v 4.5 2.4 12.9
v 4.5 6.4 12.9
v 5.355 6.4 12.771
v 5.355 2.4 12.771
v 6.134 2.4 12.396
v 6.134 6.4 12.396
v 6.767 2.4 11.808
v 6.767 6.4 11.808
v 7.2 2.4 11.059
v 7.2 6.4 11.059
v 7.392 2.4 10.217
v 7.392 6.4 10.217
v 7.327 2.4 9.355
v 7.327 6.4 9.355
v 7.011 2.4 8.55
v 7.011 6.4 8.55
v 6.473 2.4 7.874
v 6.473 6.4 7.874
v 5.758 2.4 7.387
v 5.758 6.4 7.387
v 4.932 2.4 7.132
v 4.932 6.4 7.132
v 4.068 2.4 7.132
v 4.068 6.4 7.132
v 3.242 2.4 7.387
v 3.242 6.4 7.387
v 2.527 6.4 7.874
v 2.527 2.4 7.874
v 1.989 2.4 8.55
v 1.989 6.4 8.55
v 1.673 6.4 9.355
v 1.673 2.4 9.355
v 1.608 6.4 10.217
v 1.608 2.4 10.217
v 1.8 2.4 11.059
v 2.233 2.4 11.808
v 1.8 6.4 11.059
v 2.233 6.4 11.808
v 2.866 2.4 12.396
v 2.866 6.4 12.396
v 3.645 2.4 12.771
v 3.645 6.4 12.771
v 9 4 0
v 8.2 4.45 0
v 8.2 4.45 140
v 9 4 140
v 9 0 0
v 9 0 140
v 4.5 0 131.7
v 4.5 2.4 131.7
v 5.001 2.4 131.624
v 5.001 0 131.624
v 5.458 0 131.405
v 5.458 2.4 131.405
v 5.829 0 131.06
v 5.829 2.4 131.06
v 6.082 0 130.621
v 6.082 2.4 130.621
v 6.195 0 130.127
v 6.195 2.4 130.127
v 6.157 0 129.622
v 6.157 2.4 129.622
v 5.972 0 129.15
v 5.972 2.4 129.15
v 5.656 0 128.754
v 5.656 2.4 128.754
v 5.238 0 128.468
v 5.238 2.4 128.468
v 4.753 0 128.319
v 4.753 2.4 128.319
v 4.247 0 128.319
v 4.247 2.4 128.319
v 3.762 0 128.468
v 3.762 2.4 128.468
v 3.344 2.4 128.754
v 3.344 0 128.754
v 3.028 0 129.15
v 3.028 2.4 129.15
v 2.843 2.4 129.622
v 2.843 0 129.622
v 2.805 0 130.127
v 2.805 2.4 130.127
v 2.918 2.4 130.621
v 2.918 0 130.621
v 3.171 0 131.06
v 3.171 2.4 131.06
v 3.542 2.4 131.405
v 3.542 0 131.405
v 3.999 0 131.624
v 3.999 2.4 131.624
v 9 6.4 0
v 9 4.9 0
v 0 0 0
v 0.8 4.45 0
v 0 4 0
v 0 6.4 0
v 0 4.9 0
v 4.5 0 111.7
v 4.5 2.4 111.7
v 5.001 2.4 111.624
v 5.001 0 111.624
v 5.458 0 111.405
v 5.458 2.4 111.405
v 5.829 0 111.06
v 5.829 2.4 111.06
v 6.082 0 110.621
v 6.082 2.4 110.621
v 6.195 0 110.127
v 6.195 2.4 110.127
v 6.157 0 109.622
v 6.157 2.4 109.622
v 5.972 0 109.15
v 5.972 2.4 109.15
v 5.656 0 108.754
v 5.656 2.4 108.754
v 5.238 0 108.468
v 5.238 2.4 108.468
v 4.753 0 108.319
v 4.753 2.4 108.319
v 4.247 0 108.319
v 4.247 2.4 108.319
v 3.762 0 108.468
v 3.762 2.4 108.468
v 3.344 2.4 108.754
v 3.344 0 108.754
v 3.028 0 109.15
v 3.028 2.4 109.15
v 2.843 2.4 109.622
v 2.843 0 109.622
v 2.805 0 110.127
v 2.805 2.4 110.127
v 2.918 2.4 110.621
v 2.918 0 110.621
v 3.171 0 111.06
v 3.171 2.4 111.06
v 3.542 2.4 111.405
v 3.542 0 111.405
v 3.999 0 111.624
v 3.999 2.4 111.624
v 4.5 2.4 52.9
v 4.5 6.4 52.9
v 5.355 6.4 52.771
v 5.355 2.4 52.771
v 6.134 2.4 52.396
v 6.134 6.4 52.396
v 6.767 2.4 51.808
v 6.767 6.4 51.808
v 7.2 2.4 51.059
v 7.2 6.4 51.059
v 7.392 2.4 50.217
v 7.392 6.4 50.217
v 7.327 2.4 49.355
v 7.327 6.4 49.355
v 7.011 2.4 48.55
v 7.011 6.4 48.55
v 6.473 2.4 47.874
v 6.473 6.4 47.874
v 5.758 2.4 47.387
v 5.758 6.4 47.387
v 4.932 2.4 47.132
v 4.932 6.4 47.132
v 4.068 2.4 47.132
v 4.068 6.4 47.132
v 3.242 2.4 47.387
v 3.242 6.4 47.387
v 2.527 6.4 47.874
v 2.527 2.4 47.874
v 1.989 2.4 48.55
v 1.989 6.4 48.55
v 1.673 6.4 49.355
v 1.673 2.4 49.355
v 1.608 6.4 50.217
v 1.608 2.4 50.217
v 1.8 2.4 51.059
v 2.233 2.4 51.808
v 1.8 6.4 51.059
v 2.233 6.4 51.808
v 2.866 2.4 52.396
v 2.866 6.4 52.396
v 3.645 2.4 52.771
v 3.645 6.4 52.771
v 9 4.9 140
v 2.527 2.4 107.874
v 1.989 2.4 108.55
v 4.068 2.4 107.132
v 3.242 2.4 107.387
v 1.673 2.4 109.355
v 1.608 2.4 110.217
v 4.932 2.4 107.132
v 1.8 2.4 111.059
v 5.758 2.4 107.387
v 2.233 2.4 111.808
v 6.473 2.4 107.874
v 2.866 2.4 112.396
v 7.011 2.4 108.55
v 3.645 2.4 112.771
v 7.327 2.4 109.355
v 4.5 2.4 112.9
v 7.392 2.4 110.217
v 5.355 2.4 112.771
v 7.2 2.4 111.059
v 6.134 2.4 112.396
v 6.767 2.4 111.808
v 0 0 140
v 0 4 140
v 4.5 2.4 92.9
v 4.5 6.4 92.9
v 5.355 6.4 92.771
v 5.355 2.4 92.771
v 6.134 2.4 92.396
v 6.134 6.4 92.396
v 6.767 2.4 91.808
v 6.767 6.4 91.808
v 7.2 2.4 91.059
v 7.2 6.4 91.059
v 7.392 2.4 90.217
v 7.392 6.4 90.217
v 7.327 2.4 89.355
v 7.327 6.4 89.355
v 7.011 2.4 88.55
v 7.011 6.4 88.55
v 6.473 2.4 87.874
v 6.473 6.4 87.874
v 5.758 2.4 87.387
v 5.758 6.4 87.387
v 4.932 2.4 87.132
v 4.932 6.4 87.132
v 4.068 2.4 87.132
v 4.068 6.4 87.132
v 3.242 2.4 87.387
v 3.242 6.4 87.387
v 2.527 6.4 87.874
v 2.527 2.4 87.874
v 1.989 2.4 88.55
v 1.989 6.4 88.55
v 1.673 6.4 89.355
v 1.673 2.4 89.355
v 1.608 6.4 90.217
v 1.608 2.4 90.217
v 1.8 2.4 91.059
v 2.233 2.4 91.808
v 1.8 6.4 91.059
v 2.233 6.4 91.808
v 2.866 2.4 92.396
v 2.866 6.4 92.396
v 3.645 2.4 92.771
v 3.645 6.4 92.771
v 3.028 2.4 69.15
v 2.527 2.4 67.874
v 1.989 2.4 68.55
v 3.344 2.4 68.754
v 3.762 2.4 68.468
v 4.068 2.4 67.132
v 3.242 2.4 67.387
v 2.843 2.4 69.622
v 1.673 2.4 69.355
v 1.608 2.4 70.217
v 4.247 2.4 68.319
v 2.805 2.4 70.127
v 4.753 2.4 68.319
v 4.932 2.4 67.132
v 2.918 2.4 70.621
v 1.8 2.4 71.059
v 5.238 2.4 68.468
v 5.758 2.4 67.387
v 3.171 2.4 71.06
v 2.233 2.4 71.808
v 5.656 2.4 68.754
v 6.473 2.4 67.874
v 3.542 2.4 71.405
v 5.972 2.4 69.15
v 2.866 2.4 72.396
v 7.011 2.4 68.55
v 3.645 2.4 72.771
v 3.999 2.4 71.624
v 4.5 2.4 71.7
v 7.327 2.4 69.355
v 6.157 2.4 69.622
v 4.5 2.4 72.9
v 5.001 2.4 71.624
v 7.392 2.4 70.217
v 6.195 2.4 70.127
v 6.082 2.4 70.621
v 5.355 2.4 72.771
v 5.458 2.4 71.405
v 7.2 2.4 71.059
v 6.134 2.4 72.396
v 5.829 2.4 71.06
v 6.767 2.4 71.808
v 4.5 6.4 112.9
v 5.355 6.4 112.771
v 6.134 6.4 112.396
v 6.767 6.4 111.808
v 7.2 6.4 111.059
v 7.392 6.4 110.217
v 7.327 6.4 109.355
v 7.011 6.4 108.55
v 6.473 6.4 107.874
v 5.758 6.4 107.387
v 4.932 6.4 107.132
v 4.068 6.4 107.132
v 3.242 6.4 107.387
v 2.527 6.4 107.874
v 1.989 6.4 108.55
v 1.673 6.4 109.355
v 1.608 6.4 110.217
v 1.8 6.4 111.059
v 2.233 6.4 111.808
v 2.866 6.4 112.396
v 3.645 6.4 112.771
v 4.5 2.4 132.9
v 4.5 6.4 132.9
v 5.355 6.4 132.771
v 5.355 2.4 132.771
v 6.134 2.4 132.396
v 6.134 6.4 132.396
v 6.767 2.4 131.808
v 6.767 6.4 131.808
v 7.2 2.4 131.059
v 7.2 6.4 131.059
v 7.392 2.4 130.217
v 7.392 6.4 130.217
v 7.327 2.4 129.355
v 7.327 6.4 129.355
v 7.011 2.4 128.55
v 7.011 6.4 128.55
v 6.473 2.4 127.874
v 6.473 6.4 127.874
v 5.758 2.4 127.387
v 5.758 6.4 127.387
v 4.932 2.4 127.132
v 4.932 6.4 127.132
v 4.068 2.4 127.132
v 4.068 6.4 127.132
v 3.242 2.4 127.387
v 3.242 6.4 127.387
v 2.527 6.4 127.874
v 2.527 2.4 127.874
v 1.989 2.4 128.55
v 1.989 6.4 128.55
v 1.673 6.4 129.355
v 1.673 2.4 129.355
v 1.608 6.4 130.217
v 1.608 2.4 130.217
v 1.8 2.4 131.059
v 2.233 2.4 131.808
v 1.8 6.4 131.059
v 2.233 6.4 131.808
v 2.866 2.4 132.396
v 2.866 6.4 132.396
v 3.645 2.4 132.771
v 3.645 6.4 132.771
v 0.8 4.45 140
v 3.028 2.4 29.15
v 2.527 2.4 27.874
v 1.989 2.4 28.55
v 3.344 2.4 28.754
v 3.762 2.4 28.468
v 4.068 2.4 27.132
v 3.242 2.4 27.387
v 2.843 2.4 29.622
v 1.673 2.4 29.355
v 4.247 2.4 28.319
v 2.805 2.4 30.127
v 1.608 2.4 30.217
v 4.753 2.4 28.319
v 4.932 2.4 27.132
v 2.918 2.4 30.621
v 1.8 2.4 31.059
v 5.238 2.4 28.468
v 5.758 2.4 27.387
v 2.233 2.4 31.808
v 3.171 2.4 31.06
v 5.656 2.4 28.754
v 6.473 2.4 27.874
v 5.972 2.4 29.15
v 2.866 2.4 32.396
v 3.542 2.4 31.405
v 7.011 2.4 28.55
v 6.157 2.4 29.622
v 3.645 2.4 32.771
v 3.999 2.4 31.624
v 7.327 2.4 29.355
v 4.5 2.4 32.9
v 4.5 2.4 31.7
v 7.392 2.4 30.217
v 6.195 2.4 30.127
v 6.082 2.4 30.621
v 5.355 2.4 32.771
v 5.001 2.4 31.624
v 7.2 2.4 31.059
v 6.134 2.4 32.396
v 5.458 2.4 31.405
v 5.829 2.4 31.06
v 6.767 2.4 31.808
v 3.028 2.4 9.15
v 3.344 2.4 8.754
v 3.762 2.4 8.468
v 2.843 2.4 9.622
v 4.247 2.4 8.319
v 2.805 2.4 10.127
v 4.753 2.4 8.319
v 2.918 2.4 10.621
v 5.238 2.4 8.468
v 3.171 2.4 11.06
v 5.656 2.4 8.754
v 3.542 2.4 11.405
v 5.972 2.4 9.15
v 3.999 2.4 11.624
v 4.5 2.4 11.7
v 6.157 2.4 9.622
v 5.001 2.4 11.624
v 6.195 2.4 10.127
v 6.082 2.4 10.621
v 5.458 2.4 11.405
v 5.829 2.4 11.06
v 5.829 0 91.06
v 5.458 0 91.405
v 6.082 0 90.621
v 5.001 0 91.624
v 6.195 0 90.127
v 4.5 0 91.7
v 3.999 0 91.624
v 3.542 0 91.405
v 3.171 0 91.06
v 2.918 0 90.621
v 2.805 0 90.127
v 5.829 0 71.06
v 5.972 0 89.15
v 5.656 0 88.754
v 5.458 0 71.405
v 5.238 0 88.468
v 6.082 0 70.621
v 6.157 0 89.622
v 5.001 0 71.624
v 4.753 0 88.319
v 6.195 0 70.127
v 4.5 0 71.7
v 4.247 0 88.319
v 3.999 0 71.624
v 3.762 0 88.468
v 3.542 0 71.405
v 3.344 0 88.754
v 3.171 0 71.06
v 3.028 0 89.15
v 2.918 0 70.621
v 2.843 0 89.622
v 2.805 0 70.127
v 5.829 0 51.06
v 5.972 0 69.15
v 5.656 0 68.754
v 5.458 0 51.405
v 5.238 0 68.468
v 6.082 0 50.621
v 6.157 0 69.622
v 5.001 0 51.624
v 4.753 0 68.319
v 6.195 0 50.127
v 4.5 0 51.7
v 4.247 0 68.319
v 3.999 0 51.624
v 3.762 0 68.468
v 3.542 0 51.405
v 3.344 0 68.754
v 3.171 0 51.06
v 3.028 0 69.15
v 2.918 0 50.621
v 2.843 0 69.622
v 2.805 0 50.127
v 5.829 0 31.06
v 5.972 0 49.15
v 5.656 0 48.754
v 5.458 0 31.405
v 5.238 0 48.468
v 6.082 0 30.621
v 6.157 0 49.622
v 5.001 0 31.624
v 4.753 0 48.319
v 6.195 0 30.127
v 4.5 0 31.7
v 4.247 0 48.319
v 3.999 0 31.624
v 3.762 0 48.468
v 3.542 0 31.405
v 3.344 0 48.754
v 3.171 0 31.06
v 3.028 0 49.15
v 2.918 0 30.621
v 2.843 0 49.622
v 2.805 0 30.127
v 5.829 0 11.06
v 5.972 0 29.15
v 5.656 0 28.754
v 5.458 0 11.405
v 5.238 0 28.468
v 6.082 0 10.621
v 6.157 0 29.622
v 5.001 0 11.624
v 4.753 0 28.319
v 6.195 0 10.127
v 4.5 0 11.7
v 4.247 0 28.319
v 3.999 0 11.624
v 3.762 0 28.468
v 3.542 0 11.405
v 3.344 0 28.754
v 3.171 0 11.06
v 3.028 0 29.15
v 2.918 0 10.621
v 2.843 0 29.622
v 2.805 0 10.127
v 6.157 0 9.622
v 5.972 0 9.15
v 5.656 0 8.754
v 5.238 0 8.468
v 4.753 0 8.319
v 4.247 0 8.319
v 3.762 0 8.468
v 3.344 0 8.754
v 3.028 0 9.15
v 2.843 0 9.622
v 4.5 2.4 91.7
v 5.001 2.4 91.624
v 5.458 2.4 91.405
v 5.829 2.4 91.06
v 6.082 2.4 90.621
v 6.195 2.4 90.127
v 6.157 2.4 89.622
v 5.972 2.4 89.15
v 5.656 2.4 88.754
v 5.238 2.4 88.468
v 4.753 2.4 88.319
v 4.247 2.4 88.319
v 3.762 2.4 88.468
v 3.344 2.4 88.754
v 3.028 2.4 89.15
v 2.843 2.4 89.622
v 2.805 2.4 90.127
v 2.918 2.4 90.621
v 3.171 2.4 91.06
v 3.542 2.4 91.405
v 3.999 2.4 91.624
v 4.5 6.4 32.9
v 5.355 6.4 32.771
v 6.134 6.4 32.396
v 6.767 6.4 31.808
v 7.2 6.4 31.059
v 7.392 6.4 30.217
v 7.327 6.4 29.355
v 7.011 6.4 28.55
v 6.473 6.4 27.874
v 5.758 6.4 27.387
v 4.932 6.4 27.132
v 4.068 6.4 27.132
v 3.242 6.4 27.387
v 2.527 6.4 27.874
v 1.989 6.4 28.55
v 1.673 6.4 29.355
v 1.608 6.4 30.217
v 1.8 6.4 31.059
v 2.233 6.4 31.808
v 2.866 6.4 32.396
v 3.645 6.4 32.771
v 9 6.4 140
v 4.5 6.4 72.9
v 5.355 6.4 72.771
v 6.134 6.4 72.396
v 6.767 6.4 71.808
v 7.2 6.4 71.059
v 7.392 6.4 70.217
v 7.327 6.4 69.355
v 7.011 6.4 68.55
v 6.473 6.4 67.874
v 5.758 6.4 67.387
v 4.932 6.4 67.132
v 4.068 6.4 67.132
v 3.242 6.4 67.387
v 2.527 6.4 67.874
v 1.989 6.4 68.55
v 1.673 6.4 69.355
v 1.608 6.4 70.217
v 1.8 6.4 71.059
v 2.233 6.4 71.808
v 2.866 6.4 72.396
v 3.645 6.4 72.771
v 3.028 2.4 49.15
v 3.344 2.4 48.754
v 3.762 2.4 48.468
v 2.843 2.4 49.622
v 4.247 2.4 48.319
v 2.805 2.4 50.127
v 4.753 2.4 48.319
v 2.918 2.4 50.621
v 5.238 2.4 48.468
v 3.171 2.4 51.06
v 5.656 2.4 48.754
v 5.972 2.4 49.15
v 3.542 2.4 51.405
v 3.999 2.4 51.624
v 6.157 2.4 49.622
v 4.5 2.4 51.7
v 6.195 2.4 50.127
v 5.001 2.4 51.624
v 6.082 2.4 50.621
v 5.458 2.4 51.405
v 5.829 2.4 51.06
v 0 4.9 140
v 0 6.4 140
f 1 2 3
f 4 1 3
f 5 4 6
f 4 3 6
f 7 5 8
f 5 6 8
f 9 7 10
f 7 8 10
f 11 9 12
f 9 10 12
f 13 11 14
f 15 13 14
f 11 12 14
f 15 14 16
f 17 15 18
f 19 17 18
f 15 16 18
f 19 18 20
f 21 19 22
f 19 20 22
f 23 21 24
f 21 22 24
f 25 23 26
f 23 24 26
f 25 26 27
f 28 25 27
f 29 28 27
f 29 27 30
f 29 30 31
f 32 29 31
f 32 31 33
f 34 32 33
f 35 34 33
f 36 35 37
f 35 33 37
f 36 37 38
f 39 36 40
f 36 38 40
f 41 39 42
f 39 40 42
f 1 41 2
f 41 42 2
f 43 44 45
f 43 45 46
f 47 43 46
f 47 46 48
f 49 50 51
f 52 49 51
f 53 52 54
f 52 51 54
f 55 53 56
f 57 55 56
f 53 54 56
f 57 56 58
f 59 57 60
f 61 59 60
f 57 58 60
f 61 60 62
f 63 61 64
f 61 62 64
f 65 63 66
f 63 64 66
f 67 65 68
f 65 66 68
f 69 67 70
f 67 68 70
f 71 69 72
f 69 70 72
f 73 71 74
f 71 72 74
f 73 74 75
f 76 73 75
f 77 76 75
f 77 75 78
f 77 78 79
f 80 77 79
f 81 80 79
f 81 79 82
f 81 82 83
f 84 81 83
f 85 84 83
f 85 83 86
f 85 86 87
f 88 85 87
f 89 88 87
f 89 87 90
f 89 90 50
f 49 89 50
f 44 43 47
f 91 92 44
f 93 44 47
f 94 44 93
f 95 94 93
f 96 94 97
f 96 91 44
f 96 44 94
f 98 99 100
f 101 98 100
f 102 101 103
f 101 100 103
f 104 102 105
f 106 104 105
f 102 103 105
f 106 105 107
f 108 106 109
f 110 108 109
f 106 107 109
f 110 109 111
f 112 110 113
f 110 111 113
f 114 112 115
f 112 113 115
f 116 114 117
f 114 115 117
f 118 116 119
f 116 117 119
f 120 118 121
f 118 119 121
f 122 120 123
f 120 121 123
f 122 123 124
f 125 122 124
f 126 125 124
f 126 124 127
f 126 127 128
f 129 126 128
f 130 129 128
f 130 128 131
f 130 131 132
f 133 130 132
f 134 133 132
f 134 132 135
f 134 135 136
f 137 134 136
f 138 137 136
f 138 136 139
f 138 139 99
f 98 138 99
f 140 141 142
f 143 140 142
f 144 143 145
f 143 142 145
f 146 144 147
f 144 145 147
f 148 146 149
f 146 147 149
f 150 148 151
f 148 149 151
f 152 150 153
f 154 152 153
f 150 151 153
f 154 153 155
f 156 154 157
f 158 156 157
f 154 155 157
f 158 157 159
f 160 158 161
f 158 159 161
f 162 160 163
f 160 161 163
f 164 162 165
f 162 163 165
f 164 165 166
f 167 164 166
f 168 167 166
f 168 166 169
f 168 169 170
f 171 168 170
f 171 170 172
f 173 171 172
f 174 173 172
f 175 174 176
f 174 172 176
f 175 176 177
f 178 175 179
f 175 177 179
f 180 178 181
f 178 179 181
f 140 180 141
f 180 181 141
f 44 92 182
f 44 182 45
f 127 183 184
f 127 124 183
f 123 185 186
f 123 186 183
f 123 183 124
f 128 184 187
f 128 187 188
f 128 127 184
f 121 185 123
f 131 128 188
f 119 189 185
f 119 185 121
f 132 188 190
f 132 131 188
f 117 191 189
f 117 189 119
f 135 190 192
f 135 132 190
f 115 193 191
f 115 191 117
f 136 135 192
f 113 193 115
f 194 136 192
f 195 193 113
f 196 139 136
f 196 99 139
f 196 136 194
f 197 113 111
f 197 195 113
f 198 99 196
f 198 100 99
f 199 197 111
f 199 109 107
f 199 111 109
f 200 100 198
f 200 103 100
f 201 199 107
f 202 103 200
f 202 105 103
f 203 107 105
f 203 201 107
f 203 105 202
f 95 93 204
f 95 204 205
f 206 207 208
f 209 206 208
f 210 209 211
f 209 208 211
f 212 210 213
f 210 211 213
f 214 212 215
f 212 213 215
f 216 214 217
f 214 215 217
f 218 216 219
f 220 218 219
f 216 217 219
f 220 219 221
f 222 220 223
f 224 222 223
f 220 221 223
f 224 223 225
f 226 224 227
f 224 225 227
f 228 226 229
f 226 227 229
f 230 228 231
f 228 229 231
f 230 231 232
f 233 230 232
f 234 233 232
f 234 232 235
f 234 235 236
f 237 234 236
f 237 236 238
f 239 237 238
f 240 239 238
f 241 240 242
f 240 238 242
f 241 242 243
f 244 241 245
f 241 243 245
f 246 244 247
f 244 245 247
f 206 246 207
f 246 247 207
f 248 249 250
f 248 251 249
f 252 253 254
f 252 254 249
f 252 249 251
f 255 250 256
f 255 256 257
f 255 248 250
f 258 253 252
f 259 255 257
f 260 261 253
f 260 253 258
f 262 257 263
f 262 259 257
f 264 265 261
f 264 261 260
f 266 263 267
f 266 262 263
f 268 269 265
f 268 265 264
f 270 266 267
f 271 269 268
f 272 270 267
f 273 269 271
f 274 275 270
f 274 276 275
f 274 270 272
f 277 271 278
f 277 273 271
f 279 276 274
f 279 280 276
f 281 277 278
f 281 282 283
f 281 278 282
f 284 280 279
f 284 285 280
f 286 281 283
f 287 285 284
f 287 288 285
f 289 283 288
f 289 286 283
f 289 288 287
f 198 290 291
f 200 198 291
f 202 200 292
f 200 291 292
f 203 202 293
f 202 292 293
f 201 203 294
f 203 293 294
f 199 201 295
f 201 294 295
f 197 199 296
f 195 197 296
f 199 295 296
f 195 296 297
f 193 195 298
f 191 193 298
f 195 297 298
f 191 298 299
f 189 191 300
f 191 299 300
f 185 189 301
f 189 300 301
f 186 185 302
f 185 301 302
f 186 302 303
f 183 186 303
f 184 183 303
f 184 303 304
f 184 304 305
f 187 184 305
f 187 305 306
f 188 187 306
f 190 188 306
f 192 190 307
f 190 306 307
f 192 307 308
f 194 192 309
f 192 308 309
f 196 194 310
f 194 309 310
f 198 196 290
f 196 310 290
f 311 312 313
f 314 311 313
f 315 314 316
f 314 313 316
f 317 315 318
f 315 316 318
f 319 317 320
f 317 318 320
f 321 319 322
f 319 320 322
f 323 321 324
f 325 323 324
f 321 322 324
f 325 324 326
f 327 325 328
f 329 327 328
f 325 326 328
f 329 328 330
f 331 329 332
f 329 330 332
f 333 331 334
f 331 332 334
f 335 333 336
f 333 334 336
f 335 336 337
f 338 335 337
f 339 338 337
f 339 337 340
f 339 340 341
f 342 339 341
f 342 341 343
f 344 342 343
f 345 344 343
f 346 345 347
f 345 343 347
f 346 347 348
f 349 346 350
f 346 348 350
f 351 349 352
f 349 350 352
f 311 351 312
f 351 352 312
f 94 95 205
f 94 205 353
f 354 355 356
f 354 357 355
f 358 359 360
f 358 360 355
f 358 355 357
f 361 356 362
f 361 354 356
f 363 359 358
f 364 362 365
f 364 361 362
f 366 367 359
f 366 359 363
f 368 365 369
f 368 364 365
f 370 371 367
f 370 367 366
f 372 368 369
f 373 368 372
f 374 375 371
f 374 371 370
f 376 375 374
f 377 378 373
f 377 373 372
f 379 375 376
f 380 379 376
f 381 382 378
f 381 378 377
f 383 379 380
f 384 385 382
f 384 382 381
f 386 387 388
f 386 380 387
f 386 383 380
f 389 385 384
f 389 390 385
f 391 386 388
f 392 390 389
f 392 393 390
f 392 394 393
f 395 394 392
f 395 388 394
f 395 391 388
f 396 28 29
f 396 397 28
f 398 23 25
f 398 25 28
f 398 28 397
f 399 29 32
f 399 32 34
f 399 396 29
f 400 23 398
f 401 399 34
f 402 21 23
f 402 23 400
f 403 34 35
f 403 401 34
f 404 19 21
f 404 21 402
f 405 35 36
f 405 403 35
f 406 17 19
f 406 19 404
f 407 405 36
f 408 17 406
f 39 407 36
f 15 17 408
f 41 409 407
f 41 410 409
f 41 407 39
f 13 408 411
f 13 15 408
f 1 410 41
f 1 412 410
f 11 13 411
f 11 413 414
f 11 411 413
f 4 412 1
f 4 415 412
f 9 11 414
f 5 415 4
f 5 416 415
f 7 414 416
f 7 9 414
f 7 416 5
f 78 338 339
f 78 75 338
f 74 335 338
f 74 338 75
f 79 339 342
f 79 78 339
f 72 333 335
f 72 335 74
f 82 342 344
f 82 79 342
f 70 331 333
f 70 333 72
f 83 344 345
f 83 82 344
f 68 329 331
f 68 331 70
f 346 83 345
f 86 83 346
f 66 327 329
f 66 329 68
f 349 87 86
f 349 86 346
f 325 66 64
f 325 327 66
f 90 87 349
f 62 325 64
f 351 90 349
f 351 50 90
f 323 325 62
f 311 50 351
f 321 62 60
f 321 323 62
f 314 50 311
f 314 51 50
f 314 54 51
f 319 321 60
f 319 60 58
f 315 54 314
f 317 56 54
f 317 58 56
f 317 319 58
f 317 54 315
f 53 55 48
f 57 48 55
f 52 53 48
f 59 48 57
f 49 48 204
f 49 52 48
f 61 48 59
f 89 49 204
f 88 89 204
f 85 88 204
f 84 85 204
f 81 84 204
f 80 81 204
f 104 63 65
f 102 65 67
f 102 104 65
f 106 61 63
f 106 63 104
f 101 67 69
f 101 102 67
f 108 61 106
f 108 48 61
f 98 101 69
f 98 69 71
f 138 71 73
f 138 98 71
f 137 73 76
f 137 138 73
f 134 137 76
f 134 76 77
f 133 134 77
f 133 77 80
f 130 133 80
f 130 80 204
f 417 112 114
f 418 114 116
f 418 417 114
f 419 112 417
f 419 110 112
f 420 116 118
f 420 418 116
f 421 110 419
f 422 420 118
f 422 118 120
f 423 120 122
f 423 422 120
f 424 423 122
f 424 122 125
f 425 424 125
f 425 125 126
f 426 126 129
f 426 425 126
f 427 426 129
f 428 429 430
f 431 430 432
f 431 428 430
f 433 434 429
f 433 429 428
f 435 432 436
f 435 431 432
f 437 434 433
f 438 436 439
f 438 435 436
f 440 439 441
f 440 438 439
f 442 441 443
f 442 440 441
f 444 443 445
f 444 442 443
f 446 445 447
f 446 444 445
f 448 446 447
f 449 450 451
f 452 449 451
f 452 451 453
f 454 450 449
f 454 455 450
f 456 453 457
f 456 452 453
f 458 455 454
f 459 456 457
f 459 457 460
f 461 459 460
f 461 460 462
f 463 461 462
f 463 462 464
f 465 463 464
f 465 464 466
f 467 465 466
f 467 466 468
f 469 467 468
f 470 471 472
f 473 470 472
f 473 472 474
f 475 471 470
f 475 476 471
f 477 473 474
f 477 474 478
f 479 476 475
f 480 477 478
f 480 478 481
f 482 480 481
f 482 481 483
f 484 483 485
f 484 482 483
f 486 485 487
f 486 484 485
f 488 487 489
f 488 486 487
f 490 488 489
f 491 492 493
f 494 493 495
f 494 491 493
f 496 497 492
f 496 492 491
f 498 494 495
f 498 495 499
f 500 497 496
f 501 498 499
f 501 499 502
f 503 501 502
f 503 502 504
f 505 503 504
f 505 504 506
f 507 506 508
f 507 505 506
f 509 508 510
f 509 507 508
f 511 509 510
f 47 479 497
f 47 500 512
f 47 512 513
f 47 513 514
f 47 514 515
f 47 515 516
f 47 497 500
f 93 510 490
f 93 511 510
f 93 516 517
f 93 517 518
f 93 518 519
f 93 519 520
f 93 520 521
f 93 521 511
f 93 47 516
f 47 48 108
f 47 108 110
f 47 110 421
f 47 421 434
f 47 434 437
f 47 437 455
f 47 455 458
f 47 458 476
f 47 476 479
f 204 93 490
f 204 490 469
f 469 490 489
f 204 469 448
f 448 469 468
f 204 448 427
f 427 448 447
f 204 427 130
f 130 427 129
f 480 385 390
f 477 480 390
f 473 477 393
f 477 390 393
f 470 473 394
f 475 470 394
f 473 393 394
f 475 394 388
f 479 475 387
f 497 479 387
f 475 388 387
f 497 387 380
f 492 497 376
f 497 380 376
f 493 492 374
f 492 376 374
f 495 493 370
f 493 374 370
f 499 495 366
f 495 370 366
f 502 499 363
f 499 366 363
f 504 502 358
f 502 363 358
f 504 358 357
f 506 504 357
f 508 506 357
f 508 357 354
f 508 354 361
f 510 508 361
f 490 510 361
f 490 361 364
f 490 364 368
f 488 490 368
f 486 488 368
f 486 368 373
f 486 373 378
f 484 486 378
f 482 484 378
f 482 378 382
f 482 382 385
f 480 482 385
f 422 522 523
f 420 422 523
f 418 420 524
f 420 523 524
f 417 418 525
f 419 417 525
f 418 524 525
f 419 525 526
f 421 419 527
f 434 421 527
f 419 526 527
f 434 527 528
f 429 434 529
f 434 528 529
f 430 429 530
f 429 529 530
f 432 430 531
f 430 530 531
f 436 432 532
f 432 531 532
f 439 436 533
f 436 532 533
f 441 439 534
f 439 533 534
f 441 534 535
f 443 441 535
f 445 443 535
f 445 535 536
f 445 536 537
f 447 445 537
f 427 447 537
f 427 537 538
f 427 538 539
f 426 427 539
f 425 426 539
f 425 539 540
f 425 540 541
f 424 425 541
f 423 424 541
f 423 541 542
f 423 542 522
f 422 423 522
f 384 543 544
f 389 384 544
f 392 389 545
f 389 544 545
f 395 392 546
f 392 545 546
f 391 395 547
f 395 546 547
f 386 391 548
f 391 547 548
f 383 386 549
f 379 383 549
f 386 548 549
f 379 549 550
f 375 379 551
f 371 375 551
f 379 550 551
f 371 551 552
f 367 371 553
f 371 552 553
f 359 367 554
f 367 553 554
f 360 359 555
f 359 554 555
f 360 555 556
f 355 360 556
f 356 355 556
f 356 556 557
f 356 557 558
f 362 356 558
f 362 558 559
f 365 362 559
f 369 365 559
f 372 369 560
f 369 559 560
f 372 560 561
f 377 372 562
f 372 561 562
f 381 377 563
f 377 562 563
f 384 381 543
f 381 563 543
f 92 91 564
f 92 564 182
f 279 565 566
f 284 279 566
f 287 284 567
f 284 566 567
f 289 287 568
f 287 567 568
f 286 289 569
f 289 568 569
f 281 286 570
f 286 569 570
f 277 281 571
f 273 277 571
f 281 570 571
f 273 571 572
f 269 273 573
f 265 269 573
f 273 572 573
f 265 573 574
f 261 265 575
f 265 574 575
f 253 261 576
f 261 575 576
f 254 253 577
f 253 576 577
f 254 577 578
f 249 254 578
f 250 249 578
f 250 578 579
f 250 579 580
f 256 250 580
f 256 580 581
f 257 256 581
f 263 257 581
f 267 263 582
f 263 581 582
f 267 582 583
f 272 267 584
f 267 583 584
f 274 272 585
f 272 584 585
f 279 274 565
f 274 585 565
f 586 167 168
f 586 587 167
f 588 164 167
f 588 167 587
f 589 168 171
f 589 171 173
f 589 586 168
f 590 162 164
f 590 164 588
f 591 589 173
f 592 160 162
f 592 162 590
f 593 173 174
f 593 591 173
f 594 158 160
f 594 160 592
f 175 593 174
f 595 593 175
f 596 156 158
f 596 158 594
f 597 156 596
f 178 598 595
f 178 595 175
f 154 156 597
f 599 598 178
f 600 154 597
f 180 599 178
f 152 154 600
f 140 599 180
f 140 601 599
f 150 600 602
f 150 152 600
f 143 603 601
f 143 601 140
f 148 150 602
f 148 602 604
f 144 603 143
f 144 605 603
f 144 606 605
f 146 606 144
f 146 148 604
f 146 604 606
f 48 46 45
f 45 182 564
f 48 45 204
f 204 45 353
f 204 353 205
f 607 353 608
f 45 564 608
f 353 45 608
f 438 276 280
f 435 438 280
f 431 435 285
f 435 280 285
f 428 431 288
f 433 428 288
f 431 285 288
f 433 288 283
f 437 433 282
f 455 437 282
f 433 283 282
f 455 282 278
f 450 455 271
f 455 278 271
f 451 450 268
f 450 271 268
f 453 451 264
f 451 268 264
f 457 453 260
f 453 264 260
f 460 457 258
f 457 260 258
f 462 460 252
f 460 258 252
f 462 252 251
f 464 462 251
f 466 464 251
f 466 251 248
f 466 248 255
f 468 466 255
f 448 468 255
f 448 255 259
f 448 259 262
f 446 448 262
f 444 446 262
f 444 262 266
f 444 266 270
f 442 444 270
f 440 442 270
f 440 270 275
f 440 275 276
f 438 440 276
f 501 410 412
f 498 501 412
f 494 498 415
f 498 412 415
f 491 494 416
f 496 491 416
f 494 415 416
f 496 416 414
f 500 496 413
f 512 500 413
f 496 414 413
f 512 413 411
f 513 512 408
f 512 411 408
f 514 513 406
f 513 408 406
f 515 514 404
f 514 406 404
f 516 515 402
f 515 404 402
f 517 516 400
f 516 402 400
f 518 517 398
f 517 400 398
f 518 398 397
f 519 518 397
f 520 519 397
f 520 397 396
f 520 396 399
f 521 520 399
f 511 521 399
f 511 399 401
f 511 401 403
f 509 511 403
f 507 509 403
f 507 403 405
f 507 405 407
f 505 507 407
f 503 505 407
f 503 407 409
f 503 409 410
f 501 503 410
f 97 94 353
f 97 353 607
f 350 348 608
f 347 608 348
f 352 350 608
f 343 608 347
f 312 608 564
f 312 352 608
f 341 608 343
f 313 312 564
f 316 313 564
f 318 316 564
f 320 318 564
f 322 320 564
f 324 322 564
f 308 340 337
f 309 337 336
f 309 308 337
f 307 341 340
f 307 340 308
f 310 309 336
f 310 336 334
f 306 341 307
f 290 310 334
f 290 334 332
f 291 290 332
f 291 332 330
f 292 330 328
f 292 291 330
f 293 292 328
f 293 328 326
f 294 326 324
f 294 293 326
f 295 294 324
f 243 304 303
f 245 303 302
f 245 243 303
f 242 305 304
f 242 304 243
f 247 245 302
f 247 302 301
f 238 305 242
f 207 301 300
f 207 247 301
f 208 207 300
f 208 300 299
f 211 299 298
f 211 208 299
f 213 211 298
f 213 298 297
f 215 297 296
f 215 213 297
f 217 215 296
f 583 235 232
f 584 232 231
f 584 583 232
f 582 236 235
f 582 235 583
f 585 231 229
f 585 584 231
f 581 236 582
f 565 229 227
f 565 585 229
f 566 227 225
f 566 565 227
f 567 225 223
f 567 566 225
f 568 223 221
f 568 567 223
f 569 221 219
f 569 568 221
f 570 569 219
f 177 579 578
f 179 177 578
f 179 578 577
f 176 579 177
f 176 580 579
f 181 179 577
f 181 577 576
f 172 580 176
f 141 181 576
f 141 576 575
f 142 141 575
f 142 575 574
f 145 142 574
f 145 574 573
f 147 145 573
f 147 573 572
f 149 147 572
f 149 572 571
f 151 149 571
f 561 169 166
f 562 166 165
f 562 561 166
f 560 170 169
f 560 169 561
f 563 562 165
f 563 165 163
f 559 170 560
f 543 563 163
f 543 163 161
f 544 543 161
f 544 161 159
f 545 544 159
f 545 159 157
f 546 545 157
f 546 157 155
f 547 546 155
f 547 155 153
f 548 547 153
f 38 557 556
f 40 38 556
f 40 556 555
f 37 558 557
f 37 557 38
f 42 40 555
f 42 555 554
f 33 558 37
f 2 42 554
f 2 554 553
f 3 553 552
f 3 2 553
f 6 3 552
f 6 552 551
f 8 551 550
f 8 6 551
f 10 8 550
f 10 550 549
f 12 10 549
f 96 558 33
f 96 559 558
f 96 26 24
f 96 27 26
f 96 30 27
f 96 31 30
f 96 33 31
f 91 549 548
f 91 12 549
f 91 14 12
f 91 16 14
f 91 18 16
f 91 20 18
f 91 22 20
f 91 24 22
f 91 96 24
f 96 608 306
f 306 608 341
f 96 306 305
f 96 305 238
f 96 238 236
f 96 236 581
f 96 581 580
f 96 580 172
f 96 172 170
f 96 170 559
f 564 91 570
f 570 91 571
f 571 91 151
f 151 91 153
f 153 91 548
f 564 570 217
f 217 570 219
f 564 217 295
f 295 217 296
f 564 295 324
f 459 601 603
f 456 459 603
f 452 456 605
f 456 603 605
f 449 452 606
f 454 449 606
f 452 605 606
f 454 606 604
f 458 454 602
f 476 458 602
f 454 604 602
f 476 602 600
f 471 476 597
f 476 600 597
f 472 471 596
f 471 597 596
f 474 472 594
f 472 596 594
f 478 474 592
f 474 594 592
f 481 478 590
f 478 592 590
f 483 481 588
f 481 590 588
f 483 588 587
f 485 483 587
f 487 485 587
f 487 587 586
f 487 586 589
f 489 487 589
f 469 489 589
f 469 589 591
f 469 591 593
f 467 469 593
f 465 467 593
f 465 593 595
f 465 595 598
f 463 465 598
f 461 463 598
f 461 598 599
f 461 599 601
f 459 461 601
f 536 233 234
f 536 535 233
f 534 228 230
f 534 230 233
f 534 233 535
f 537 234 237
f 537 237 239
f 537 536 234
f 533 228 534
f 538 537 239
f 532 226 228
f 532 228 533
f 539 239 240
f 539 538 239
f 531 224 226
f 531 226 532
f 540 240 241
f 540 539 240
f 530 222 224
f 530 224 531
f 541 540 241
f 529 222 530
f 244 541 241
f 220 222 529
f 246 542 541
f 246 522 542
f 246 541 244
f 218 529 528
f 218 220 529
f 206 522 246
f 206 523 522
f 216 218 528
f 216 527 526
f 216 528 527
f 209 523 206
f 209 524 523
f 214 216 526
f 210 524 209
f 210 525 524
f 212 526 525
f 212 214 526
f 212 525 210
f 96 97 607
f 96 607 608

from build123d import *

# Parameters (mm, degrees)
BOSS_EXTRUDE1_DEPTH = 140
SKETCH2_R           = 2.9
CUT_EXTRUDE1_DEPTH  = 4
SKETCH3_R           = 1.7
CUT_EXTRUDE2_DEPTH  = 141.346001012


with BuildPart() as part:
    # Sketch1 → Boss-Extrude1 (new body)
    with BuildSketch(Plane.XY):
        Polygon((9, 6.4), (9, 4.9), (8.2, 4.45), (9, 4), (9, 0), (0, 0), (0, 4), (0.8, 4.45), (0, 4.9), (0, 6.4), align=None)
    extrude(amount=BOSS_EXTRUDE1_DEPTH)

    # Sketch2 → Cut-Extrude1 (cut)
    with BuildSketch(Plane(origin=(0, 6.4, 0), x_dir=(1, 0, 0), z_dir=(0, 1, 0))):
        with Locations(Location((4.5, -130, 0), (0, 0, 270))):
            Circle(SKETCH2_R)
        with Locations(Location((4.5, -110, 0), (0, 0, 270))):
            Circle(SKETCH2_R)
        with Locations(Location((4.5, -90, 0), (0, 0, 270))):
            Circle(SKETCH2_R)
        with Locations(Location((4.5, -70, 0), (0, 0, 270))):
            Circle(SKETCH2_R)
        with Locations(Location((4.5, -50, 0), (0, 0, 270))):
            Circle(SKETCH2_R)
        with Locations(Location((4.5, -30, 0), (0, 0, 270))):
            Circle(SKETCH2_R)
        with Locations(Location((4.5, -10, 0), (0, 0, 270))):
            Circle(SKETCH2_R)
    extrude(amount=-CUT_EXTRUDE1_DEPTH, mode=Mode.SUBTRACT)

    # Sketch3 → Cut-Extrude2 (cut, through all)
    with BuildSketch(Plane(origin=(0, 2.4, 0), x_dir=(1, 0, 0), z_dir=(0, 1, 0))):
        with Locations(Location((4.5, -130, 0), (0, 0, 270))):
            Circle(SKETCH3_R)
        with Locations(Location((4.5, -110, 0), (0, 0, 270))):
            Circle(SKETCH3_R)
        with Locations(Location((4.5, -90, 0), (0, 0, 270))):
            Circle(SKETCH3_R)
        with Locations(Location((4.5, -70, 0), (0, 0, 270))):
            Circle(SKETCH3_R)
        with Locations(Location((4.5, -50, 0), (0, 0, 270))):
            Circle(SKETCH3_R)
        with Locations(Location((4.5, -30, 0), (0, 0, 270))):
            Circle(SKETCH3_R)
        with Locations(Location((4.5, -10, 0), (0, 0, 270))):
            Circle(SKETCH3_R)
    extrude(amount=-CUT_EXTRUDE2_DEPTH, mode=Mode.SUBTRACT)


solid = part.part
